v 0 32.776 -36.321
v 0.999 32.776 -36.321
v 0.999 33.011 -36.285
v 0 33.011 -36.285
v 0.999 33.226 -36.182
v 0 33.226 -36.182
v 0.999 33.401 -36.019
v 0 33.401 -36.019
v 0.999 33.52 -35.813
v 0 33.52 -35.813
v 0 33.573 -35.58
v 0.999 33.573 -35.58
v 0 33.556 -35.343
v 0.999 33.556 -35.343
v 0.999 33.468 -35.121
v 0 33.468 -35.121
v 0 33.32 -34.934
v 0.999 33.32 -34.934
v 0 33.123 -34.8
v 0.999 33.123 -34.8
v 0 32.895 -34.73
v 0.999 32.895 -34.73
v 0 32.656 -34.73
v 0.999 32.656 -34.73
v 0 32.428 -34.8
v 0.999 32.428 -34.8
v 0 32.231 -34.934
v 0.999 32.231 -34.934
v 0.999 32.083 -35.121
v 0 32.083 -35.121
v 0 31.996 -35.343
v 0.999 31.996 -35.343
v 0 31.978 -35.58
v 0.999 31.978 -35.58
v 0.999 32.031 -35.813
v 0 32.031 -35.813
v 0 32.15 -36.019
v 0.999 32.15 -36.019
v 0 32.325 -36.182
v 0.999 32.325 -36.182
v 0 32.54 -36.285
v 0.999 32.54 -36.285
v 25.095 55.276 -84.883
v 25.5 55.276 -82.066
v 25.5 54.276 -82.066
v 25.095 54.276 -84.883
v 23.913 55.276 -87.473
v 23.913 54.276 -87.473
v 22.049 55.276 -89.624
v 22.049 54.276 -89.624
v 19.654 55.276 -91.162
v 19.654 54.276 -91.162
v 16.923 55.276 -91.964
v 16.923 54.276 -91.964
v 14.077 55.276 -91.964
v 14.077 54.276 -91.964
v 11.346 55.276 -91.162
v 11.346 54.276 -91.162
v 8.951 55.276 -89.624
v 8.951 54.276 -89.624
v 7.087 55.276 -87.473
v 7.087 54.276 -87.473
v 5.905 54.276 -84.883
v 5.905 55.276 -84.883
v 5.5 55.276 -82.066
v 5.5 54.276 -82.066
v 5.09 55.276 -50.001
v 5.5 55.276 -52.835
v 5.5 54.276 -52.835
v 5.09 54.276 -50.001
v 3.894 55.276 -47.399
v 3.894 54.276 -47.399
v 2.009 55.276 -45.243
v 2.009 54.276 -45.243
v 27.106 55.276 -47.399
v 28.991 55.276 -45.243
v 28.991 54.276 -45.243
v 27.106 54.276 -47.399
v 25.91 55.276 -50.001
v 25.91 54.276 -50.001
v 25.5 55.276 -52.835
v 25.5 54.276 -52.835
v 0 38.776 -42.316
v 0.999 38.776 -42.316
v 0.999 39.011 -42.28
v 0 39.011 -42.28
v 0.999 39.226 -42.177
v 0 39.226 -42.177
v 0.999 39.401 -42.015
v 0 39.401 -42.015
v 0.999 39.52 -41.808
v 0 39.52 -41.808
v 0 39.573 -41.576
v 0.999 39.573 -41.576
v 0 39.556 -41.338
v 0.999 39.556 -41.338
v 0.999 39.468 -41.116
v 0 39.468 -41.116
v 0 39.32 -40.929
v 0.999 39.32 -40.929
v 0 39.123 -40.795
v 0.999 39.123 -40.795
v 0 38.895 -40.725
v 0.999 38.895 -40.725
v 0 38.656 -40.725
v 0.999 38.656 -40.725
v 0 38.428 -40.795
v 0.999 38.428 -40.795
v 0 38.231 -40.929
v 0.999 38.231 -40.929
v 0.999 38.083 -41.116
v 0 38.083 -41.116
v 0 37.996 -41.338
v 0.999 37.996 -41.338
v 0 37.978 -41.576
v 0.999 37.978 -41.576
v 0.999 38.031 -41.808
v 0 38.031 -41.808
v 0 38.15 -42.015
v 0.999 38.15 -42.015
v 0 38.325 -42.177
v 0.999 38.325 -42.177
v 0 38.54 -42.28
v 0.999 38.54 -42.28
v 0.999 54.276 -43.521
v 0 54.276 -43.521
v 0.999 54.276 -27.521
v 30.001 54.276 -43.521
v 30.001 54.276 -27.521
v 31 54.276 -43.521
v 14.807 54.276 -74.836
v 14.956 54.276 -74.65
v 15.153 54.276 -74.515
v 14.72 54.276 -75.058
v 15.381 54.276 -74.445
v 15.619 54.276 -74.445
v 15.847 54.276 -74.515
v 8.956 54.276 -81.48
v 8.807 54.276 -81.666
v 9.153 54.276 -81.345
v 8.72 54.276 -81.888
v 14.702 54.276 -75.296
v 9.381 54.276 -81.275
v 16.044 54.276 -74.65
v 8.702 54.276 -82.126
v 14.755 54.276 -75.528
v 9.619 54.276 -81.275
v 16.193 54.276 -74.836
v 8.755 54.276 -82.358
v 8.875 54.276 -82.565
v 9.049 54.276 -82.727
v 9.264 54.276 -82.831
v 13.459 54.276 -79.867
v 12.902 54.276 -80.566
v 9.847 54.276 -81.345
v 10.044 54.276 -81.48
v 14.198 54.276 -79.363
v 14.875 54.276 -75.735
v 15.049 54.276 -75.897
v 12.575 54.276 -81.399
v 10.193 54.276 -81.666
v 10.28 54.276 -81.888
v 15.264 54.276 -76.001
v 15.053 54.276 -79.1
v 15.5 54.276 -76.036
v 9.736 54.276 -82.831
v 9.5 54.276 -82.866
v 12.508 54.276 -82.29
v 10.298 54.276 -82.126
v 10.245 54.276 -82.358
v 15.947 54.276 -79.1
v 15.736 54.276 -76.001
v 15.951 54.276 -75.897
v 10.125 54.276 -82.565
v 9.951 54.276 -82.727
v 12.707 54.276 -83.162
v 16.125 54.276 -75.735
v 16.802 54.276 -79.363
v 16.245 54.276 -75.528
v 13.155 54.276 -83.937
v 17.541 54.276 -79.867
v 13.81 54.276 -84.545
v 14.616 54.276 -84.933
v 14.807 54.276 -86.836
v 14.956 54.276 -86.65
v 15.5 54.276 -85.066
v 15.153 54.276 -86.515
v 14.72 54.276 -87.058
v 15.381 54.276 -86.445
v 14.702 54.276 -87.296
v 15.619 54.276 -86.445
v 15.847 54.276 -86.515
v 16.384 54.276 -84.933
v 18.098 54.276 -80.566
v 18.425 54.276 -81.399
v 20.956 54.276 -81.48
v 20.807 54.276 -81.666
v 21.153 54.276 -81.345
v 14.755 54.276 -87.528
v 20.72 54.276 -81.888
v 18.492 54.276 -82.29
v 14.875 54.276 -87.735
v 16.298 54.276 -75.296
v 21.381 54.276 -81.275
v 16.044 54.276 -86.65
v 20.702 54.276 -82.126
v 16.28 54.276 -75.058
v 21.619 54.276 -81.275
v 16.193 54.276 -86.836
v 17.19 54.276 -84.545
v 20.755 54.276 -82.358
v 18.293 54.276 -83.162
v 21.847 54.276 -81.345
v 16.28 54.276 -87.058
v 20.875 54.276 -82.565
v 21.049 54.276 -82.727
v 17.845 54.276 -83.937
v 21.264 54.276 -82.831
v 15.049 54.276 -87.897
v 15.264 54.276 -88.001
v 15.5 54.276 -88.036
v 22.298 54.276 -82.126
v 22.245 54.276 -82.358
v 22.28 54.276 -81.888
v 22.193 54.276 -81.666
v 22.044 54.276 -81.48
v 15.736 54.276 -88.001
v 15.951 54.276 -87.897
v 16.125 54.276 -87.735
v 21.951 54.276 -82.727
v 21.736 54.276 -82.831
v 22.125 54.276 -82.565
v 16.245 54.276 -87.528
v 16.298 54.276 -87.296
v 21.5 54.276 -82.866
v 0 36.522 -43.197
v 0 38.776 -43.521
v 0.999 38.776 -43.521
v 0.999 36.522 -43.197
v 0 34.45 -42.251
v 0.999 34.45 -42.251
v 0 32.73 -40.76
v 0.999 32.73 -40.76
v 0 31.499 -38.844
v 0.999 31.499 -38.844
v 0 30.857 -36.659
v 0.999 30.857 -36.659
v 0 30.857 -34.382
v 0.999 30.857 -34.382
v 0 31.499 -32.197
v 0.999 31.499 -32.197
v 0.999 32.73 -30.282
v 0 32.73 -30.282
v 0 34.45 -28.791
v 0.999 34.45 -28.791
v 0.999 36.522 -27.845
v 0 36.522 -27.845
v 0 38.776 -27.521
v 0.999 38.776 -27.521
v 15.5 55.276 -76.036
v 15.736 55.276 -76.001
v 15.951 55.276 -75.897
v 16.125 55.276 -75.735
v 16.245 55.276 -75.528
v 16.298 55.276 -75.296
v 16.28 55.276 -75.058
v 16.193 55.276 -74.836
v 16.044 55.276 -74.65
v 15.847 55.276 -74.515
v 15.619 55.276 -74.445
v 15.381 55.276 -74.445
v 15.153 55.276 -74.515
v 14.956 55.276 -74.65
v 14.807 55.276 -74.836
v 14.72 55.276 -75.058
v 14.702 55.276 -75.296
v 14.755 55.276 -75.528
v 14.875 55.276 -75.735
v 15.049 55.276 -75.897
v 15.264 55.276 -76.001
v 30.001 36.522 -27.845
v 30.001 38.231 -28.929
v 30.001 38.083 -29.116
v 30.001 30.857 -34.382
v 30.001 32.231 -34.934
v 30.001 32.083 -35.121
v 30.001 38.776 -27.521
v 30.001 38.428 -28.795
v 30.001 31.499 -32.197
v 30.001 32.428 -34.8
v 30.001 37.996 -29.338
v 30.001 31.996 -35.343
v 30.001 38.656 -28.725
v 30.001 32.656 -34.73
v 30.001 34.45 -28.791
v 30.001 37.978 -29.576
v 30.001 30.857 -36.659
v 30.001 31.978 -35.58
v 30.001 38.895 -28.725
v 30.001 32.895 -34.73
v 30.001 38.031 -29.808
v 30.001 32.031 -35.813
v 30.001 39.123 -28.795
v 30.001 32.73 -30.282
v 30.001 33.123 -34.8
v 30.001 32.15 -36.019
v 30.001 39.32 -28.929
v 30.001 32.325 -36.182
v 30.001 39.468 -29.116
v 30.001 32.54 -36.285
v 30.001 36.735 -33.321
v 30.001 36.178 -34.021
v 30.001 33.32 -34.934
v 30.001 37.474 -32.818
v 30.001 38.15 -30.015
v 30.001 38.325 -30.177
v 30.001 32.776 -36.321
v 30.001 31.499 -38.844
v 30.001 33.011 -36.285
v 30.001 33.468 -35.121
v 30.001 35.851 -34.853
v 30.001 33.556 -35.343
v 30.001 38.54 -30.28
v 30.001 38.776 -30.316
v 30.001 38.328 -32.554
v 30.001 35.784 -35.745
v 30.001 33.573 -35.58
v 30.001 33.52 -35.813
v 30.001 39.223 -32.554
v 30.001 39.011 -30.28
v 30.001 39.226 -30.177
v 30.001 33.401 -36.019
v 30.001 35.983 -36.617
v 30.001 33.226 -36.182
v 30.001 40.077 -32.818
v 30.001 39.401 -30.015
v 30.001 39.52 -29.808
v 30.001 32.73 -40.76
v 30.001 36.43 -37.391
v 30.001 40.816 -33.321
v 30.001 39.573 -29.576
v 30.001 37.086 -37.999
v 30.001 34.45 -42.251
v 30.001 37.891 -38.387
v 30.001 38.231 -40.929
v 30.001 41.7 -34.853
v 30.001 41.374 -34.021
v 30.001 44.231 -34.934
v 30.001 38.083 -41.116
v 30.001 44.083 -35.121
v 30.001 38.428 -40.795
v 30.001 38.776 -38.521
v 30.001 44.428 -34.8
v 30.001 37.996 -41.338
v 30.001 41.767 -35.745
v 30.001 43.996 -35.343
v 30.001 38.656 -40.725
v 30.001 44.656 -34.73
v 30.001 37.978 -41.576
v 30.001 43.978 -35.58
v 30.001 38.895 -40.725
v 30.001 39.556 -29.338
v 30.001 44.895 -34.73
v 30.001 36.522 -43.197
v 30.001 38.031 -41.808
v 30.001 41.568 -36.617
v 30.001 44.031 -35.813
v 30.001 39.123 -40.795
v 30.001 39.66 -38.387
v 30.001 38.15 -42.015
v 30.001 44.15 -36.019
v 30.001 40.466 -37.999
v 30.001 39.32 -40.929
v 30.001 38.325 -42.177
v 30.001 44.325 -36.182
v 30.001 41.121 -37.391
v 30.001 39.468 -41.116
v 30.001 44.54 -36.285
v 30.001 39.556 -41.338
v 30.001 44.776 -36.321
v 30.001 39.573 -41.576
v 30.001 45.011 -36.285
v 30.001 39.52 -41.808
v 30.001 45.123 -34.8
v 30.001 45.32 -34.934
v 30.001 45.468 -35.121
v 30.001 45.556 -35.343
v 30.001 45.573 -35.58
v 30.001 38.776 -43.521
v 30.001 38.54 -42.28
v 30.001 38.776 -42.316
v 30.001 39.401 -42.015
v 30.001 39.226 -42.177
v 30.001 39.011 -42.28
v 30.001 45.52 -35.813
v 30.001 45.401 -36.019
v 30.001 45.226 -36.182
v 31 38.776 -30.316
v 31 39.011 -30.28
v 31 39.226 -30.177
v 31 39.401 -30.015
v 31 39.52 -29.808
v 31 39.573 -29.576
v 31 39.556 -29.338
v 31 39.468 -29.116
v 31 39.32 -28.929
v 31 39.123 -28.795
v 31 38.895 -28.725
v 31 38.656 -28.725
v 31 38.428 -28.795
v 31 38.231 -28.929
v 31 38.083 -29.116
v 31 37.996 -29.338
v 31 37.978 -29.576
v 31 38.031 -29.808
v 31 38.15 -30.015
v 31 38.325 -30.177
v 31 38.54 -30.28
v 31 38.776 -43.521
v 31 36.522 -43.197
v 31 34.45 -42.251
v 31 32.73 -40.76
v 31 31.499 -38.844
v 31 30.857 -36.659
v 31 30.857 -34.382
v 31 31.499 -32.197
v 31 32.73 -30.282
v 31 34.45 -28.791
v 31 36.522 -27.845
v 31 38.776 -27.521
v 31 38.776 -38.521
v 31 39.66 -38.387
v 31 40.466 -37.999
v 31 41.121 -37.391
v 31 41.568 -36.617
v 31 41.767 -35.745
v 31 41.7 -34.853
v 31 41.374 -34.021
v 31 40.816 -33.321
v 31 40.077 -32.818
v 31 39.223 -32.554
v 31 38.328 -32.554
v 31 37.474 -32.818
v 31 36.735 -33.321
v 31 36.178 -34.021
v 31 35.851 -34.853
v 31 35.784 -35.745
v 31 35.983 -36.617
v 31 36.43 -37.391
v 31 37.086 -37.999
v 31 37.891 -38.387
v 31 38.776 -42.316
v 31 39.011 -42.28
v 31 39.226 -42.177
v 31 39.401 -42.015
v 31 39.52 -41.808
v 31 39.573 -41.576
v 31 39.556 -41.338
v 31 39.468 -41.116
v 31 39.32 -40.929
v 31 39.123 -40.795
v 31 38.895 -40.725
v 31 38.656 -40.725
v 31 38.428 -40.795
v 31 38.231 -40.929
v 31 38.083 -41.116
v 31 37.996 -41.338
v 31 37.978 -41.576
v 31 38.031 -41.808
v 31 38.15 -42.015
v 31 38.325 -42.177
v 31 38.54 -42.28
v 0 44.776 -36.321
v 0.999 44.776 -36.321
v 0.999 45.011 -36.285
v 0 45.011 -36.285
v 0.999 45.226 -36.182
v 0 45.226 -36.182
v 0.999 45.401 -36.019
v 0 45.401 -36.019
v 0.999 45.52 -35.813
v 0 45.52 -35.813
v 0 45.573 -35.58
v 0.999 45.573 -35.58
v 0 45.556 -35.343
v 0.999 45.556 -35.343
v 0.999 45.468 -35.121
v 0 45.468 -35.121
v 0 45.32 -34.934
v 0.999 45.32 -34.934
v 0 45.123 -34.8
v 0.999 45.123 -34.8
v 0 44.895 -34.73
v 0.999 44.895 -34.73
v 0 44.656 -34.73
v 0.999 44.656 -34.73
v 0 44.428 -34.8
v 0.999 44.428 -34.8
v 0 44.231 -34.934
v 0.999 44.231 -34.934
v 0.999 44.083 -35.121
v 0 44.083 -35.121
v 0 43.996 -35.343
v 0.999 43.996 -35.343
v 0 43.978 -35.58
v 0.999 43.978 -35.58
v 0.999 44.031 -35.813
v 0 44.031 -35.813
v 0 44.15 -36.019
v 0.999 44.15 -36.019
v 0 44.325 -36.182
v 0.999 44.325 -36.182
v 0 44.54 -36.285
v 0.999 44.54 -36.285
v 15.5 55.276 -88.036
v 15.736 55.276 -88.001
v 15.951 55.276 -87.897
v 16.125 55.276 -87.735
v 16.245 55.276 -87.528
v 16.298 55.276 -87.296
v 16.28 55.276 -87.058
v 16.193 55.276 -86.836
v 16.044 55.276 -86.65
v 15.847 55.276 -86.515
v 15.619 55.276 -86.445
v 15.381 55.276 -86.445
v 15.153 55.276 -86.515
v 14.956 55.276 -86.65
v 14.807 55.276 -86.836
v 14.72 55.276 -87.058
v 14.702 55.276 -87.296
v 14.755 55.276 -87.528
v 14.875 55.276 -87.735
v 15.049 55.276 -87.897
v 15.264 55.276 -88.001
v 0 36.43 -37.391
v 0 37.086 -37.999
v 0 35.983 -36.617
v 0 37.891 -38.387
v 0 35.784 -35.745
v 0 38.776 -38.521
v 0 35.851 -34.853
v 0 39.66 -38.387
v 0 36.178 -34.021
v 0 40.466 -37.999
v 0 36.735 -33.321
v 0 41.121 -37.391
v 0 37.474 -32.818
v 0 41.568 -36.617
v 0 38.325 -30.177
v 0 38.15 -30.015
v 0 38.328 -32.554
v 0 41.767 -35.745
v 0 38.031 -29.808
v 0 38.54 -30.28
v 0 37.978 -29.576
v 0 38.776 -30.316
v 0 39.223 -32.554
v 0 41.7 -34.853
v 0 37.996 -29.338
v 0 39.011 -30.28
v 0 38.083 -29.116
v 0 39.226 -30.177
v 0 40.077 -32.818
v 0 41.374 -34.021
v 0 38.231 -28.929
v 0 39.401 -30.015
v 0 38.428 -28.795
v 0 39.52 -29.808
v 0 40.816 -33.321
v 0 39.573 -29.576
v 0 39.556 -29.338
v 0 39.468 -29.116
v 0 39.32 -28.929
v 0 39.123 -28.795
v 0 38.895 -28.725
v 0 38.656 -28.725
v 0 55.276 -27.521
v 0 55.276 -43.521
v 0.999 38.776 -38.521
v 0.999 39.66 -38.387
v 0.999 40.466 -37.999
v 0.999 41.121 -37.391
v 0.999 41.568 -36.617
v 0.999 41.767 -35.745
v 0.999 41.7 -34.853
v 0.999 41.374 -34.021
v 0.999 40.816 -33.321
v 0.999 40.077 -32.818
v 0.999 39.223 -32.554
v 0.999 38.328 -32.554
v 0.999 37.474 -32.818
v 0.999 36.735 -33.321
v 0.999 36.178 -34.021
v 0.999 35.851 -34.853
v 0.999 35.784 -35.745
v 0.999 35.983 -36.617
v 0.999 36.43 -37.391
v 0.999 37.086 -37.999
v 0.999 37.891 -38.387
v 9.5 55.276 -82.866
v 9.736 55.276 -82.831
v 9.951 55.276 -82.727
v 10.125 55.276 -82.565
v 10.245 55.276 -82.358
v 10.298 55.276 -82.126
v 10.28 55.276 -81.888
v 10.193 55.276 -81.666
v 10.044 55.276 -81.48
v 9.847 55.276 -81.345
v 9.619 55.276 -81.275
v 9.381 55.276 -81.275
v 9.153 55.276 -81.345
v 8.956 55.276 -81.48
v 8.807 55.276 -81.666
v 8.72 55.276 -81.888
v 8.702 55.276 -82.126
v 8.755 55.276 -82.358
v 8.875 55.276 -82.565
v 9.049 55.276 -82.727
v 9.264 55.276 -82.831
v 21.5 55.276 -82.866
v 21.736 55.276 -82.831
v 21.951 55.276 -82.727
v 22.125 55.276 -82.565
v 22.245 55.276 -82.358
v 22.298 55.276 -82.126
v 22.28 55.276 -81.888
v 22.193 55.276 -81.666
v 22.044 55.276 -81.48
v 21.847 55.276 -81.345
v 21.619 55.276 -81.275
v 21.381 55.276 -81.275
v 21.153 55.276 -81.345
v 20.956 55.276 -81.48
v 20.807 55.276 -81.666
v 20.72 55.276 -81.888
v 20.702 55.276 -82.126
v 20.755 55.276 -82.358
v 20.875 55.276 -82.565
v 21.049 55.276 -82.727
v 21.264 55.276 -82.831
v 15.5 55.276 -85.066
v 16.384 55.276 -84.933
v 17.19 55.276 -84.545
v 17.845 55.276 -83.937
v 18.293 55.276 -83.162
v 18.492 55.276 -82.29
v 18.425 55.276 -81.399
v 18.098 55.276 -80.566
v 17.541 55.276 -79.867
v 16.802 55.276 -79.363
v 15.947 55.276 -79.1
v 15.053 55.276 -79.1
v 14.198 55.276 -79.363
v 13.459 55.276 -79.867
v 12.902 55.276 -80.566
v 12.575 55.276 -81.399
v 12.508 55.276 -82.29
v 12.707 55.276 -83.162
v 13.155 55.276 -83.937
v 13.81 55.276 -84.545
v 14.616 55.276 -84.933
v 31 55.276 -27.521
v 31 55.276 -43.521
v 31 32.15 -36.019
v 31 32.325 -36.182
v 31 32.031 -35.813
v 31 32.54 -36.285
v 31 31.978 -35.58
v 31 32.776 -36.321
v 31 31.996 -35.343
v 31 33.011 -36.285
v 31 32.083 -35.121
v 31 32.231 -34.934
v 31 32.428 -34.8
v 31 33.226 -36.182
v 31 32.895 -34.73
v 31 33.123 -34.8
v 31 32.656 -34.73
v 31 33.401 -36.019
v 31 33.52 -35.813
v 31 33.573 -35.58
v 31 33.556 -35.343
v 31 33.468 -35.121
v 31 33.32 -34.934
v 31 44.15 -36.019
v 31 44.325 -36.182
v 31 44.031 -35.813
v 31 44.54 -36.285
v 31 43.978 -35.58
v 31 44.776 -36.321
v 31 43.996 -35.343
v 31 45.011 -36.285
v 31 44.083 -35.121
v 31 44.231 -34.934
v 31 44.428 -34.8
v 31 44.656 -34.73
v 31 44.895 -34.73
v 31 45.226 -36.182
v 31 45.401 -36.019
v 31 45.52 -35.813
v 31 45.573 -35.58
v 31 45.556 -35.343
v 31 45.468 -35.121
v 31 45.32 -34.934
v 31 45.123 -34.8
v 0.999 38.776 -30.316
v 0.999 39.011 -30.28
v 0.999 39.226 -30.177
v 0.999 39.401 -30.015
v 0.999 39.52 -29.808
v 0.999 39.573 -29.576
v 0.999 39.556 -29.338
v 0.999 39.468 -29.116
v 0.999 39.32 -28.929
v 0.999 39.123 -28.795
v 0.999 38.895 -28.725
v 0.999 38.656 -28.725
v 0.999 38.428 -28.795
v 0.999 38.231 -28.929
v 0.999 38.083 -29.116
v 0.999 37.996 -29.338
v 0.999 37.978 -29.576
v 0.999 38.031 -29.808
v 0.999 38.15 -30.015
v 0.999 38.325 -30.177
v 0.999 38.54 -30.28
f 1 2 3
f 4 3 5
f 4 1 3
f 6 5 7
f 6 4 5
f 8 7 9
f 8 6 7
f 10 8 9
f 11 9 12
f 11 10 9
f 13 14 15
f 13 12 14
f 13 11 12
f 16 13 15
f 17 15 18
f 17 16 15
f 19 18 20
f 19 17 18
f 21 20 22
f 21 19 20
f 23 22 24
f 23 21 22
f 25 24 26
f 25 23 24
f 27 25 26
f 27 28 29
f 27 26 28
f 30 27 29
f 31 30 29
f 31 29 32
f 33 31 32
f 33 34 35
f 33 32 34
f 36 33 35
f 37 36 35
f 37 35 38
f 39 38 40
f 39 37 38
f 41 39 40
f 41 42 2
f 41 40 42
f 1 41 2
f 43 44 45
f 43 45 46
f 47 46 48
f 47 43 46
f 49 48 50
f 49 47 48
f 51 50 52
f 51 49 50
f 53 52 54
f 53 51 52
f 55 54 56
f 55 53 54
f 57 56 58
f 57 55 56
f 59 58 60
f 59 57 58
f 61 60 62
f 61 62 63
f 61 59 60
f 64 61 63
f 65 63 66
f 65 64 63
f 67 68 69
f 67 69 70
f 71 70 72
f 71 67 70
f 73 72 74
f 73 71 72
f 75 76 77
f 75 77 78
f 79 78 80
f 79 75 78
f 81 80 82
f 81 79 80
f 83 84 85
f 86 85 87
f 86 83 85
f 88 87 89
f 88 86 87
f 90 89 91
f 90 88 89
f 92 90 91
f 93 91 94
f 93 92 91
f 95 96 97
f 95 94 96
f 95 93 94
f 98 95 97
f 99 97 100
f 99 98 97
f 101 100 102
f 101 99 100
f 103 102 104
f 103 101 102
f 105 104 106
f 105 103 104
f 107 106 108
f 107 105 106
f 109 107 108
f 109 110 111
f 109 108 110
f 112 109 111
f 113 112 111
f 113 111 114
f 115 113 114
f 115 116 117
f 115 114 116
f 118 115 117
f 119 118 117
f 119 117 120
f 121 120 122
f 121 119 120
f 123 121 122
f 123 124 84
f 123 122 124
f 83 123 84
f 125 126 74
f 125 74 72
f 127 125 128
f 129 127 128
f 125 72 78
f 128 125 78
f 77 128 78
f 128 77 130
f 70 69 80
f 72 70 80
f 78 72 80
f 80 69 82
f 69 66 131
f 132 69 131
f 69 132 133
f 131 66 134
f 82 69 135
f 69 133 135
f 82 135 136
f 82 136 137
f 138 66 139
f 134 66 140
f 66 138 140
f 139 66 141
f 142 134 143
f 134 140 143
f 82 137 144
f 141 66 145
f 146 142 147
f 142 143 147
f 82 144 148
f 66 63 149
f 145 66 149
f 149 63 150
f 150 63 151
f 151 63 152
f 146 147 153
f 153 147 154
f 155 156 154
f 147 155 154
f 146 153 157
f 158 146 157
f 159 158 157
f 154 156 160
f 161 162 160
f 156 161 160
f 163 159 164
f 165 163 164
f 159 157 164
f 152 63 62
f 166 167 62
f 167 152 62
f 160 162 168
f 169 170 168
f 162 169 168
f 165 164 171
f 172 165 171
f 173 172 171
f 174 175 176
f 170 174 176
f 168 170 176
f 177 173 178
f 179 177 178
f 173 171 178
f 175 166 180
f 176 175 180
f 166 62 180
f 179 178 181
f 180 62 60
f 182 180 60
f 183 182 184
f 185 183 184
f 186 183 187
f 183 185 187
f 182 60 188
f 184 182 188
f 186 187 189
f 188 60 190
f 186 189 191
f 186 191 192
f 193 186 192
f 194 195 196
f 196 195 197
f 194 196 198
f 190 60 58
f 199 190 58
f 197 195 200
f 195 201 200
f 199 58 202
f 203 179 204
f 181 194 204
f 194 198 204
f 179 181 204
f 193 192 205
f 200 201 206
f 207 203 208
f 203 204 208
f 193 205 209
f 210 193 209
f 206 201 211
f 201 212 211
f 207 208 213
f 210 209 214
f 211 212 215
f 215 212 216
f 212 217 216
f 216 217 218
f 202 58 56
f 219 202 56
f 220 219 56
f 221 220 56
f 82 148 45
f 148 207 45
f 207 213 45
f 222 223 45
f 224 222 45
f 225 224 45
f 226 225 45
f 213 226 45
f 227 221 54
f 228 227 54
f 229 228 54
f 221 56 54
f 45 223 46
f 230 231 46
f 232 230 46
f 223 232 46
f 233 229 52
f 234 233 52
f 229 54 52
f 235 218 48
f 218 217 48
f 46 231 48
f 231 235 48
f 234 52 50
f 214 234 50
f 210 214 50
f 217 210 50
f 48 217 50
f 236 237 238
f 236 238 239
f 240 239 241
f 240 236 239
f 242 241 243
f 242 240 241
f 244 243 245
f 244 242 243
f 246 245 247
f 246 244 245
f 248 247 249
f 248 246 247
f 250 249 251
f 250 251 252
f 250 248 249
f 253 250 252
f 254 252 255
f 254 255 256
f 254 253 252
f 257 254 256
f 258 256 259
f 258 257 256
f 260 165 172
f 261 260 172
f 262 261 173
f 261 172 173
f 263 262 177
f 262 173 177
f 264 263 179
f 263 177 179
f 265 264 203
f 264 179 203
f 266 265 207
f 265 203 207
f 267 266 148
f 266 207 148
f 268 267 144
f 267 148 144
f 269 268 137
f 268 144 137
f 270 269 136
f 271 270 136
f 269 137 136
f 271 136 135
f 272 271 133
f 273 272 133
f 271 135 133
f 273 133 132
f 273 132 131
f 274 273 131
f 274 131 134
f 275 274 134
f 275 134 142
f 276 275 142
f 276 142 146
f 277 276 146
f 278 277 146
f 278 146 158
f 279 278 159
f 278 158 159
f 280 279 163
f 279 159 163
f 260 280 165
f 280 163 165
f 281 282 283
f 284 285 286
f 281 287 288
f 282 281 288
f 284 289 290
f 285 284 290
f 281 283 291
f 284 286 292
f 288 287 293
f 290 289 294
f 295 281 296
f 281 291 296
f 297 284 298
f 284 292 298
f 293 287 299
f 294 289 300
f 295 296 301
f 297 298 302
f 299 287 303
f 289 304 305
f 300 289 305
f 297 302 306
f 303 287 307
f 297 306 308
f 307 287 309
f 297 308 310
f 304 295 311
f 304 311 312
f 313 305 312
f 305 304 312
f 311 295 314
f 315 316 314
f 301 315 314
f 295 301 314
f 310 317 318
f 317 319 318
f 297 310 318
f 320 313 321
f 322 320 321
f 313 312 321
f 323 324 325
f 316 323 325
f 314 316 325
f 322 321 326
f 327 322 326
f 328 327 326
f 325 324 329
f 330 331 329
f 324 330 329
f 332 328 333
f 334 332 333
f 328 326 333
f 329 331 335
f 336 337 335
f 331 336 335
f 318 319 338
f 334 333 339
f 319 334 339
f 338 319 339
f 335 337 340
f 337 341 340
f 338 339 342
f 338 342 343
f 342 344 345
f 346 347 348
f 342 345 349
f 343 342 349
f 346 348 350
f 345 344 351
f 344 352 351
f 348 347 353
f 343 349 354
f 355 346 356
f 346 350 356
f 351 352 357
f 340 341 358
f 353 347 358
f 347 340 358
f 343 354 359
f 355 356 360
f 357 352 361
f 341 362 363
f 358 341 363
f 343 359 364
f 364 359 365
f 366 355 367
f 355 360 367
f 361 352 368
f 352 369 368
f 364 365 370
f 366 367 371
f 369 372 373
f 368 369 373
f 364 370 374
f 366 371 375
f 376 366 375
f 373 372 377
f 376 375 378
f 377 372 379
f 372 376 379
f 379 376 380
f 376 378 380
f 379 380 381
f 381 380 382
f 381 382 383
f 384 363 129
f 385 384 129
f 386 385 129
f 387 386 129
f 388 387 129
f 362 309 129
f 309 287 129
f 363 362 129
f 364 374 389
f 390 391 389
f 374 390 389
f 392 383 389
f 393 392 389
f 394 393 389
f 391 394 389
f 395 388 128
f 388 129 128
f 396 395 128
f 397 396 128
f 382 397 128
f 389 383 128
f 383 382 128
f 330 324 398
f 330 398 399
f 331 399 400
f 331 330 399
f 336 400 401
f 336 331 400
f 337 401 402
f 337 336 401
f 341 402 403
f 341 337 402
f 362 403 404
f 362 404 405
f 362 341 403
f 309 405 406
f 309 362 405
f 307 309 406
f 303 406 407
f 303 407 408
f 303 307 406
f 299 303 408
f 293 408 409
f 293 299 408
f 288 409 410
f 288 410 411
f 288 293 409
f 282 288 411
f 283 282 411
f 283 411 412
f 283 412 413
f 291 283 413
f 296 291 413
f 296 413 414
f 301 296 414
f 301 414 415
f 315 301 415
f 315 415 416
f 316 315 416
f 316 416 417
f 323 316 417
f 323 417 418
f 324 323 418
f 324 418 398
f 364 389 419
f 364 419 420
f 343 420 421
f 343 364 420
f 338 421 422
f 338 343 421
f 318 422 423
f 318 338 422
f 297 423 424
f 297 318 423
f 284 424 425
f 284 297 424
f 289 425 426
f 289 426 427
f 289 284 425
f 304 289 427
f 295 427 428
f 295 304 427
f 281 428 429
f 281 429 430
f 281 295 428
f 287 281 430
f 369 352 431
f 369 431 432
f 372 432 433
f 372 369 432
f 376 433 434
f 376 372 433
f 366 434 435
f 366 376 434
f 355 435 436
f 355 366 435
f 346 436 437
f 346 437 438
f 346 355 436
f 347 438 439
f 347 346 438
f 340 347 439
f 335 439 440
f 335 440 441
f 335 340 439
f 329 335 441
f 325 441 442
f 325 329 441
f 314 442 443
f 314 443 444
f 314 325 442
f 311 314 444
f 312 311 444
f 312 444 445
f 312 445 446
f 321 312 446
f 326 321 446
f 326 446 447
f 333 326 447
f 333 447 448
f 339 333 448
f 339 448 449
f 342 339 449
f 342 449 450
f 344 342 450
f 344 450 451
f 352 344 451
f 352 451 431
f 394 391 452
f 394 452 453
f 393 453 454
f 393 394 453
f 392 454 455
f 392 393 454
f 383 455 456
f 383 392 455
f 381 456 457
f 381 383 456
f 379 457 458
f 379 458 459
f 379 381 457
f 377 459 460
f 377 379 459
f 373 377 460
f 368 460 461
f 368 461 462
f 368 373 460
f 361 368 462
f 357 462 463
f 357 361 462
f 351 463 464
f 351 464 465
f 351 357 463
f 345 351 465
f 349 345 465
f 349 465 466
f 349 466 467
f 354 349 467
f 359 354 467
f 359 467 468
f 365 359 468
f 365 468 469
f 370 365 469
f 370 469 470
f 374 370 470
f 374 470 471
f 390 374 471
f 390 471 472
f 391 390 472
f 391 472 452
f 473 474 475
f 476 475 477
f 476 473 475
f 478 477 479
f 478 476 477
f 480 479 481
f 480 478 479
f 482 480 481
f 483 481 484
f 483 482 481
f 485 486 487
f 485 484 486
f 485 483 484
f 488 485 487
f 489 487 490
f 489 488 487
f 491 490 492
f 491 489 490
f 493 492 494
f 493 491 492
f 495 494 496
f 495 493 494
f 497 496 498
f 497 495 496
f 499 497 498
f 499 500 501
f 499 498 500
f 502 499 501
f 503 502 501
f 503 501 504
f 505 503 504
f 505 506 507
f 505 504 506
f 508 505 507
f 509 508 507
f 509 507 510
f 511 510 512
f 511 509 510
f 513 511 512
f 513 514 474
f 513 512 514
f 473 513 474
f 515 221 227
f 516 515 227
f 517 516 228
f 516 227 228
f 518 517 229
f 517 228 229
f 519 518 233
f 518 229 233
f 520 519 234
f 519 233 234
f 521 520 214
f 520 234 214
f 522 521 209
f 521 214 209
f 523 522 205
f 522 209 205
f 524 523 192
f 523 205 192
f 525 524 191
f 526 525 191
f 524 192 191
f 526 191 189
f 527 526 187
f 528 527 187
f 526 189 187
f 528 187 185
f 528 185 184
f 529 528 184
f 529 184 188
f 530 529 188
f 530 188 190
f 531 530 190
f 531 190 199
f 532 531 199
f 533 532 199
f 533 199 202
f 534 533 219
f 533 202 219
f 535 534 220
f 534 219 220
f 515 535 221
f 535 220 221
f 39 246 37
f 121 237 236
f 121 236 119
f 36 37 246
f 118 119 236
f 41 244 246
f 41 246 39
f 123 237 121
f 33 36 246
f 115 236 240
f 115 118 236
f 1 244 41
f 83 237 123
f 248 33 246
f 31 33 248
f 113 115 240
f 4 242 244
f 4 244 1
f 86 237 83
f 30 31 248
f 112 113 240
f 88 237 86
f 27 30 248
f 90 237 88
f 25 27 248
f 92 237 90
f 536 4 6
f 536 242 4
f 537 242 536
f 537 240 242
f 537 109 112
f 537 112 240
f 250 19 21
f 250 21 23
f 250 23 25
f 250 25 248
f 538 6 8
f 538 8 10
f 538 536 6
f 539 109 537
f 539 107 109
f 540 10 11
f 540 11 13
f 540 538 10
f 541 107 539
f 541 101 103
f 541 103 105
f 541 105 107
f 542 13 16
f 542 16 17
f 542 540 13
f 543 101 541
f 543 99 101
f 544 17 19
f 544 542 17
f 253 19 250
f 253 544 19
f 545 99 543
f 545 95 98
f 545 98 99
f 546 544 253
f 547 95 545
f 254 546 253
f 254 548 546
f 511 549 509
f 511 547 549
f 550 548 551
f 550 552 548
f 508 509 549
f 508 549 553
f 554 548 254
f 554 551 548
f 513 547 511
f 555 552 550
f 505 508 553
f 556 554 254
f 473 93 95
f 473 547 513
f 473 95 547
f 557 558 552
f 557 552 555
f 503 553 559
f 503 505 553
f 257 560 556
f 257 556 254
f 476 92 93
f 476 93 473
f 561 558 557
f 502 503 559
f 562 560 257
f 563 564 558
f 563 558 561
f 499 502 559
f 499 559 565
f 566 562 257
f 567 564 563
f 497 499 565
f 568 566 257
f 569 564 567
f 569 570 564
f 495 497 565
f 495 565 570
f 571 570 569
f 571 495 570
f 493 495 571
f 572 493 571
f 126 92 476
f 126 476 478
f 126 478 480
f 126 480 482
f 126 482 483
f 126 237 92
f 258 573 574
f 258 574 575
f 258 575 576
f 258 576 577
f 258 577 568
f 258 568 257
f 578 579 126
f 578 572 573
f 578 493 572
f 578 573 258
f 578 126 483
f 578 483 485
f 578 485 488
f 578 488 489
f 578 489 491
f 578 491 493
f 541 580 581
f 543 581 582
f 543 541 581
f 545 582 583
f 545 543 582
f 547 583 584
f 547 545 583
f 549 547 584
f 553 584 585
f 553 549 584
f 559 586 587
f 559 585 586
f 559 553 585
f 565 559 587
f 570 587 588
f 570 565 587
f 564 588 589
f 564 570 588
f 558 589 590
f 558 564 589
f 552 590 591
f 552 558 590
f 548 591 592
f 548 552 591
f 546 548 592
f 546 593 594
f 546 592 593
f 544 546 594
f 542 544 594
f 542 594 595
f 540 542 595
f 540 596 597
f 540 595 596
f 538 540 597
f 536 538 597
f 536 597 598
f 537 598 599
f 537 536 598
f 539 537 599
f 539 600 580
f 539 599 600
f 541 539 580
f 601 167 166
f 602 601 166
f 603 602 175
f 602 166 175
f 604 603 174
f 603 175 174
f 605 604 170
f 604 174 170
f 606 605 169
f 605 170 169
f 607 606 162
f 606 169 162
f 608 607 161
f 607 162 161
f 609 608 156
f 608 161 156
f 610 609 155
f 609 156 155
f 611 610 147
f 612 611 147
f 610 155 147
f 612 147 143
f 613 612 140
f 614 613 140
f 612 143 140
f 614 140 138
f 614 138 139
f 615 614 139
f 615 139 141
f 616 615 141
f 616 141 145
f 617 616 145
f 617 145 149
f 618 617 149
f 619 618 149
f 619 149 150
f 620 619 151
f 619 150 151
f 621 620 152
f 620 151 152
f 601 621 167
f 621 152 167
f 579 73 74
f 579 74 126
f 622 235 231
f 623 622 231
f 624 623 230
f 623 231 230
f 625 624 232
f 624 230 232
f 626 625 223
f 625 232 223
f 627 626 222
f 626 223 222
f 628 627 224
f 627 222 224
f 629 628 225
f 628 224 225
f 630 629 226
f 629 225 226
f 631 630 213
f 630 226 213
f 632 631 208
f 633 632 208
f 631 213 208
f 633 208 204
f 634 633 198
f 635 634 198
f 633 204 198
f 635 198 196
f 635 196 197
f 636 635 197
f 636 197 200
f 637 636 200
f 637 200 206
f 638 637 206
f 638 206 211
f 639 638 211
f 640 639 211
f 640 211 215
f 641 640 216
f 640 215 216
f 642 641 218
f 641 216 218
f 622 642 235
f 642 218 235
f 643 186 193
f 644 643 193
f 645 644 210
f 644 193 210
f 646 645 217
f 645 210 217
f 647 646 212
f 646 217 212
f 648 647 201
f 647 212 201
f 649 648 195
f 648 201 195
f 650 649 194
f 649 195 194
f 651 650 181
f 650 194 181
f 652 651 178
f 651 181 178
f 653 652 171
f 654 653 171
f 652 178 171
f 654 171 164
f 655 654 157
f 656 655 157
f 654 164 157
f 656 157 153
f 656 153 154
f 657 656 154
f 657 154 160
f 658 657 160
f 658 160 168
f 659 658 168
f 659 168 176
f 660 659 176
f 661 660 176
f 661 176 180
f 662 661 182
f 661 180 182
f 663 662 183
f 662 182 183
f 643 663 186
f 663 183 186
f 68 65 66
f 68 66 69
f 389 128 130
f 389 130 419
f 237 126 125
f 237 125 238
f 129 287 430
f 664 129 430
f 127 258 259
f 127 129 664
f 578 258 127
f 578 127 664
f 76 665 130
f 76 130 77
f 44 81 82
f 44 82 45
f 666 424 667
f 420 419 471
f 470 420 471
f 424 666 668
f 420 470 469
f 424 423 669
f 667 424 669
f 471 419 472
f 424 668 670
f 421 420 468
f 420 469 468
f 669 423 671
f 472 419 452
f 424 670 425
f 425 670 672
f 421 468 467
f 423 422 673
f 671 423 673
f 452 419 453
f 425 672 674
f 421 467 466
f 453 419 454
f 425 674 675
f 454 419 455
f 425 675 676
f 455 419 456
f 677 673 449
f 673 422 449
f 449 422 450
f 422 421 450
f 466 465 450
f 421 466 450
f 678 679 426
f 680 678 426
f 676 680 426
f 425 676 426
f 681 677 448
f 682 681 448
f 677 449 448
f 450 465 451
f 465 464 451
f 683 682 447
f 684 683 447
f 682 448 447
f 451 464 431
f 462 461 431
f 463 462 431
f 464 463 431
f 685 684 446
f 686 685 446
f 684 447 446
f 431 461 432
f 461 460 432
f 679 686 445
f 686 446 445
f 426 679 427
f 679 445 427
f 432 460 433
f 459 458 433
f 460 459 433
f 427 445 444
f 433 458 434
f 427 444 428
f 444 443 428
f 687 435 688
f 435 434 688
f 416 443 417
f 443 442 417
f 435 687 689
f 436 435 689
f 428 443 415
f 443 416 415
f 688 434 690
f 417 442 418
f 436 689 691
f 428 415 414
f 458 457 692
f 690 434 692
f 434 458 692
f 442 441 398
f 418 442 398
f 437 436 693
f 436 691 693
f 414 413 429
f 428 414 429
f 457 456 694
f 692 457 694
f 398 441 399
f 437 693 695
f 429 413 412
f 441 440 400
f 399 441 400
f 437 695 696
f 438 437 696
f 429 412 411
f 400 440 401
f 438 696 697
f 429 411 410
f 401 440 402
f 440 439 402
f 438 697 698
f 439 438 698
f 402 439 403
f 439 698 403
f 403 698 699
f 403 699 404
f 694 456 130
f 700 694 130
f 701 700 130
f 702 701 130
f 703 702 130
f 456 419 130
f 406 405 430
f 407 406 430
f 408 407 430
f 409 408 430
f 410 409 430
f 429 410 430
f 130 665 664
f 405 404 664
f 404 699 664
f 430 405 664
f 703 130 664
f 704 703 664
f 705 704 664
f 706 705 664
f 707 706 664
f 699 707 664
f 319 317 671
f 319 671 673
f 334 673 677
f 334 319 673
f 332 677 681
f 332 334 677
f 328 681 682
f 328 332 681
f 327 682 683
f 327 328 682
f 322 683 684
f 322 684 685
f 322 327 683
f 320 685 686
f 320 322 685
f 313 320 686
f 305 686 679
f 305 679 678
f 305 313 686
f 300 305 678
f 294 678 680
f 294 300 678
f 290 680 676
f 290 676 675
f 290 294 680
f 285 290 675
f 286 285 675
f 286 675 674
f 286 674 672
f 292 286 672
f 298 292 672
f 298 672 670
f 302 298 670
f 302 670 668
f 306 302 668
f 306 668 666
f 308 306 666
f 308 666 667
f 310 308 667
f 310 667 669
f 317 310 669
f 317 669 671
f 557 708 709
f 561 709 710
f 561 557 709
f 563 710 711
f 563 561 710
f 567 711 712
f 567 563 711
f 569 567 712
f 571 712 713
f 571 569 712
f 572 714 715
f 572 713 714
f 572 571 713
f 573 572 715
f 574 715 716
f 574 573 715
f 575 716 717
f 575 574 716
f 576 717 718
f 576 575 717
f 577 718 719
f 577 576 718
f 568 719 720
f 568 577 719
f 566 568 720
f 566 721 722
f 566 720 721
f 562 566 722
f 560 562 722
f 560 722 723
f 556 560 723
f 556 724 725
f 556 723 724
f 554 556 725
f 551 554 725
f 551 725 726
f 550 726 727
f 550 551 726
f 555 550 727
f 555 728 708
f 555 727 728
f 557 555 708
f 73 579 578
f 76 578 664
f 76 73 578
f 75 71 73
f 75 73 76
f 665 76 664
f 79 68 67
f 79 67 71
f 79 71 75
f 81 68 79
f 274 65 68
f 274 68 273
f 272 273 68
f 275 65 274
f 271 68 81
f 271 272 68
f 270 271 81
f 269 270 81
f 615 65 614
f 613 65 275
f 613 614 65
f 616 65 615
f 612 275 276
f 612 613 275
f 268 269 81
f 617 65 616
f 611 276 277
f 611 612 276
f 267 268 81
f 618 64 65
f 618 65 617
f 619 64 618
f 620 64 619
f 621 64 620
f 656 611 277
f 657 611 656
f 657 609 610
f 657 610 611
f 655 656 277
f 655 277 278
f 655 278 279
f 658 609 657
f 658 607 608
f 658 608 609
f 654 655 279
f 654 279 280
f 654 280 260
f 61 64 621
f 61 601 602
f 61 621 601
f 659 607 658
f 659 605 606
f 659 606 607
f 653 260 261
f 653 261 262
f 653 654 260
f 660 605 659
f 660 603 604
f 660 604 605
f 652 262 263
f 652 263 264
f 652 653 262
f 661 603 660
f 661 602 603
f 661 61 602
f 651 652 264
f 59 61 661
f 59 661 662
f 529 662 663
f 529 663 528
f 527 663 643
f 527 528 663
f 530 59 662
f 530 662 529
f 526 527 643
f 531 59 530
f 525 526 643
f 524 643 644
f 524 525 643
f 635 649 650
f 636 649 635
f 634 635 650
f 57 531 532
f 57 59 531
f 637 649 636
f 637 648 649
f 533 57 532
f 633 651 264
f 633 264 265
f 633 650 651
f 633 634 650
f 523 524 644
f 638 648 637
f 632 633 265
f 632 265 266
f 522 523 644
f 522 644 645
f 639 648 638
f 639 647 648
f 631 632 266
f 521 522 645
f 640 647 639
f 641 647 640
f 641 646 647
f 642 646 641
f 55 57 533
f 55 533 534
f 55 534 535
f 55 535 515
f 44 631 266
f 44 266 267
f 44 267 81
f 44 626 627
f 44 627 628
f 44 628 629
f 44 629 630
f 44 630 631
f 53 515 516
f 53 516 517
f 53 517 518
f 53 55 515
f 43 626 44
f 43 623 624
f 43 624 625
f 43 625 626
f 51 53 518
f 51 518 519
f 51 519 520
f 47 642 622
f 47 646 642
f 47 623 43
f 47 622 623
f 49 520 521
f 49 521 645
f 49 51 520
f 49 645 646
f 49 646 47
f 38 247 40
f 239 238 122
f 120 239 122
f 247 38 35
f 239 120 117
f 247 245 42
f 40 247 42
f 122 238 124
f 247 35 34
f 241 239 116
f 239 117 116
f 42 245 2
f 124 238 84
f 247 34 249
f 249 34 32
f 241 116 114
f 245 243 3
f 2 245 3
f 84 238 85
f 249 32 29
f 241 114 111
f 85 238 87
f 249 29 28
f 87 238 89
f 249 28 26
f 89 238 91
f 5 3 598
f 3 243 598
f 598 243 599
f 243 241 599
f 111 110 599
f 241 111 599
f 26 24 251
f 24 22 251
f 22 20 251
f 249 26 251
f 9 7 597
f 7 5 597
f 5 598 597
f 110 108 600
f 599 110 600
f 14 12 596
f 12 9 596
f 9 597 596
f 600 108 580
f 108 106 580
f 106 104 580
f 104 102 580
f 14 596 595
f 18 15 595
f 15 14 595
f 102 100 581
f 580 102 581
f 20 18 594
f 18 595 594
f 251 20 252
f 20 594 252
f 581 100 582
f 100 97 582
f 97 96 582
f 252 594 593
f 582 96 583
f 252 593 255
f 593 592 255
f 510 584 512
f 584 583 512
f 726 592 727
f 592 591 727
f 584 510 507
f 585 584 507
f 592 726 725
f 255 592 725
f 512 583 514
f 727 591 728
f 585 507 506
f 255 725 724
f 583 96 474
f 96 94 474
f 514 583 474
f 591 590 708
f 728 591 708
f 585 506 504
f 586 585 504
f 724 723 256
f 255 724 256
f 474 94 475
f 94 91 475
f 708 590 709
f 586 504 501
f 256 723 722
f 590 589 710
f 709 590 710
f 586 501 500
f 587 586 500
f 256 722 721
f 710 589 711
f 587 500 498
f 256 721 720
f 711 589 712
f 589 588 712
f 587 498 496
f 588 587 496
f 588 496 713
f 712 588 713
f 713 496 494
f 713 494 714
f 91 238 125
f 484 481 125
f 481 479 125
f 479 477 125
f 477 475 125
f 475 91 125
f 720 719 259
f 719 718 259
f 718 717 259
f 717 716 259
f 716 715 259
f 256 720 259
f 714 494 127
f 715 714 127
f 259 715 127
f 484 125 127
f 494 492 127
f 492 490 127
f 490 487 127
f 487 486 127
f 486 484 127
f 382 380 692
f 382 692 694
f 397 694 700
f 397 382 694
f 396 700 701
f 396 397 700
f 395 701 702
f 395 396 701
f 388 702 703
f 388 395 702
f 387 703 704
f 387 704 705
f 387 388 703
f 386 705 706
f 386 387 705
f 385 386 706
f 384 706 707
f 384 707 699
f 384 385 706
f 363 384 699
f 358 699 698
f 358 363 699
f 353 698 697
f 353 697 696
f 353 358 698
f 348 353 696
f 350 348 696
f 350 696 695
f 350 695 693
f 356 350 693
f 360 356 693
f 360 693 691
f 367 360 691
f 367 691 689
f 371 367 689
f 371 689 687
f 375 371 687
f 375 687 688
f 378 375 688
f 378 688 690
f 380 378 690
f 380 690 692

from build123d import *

# Parameters (mm, degrees)
SKETCH1_R           = 0.8
SKETCH1_R_2         = 3
BOSS_EXTRUDE1_DEPTH = 31
BOSS_EXTRUDE2_DEPTH = 1
SKETCH5_R           = 0.8
CUT_EXTRUDE3_DEPTH  = 1
SKETCH5_3_R         = 3
CUT_EXTRUDE4_DEPTH  = 1
CUT_EXTRUDE5_START  = -1
CUT_EXTRUDE5_DEPTH  = 100.186902849


with BuildPart() as part:
    # Sketch1 → Boss-Extrude1 (new body)
    with BuildSketch(Plane(origin=(0, 0, 0), x_dir=(0, 0, -1), z_dir=(1, 0, 0))):
        with BuildLine():
            Line((27.520646447, 38.775594), (27.520646447, 55.275594))
            Line((27.520646447, 55.275594), (43.520646447, 55.275594))
            Line((43.520646447, 55.275594), (43.520646447, 38.775594))
            ThreePointArc((43.520646447, 38.775594), (35.520646447, 30.775594), (27.520646447, 38.775594))
        make_face()
        with Locations((35.520646447, 44.775594)):
            Circle(SKETCH1_R, mode=Mode.SUBTRACT)
        with Locations((41.515881392, 38.775594)):
            Circle(SKETCH1_R, mode=Mode.SUBTRACT)
        with Locations((35.520646447, 32.775594)):
            Circle(SKETCH1_R, mode=Mode.SUBTRACT)
        with Locations((29.515881392, 38.775594)):
            Circle(SKETCH1_R, mode=Mode.SUBTRACT)
        with Locations((35.520646447, 38.775594)):
            Circle(SKETCH1_R_2, mode=Mode.SUBTRACT)
    extrude(amount=BOSS_EXTRUDE1_DEPTH)

    # Sketch4 → Boss-Extrude2 (add)
    with BuildSketch(Plane(origin=(0, 55.275594, 0), x_dir=(1, 0, 0), z_dir=(0, 1, 0))):
        with BuildLine():
            Line((0, 43.520646447), (31, 43.520646447))
            Line((31, 43.520646447), (28.991162523, 45.242931174))
            ThreePointArc((28.991162523, 45.242931174), (26.414616828, 48.656689929), (25.5, 52.83470532))
            Line((25.5, 52.83470532), (25.5, 82.06609312))
            ThreePointArc((25.5, 82.06609312), (15.5, 92.06609312), (5.5, 82.06609312))
            Line((5.5, 82.06609312), (5.5, 52.83470532))
            ThreePointArc((5.5, 52.83470532), (4.585383172, 48.656689929), (2.008837477, 45.242931174))
            Line((2.008837477, 45.242931174), (0, 43.520646447))
        make_face()
    extrude(amount=-BOSS_EXTRUDE2_DEPTH)

    # Sketch5 → Cut-Extrude3 (cut)
    with BuildSketch(Plane.XZ.offset(-54.275594)):
        with Locations((9.5, -82.06609312)):
            Circle(SKETCH5_R)
        with Locations((15.5, -75.236093118)):
            Circle(SKETCH5_R)
        with Locations((21.5, -82.06609312)):
            Circle(SKETCH5_R)
        with Locations((15.5, -87.236093118)):
            Circle(SKETCH5_R)
    extrude(amount=-CUT_EXTRUDE3_DEPTH, mode=Mode.SUBTRACT)

    # Sketch5<3> → Cut-Extrude4 (cut)
    with BuildSketch(Plane.XZ.offset(-54.275594)):
        with Locations((15.5, -82.06609312)):
            Circle(SKETCH5_3_R)
    extrude(amount=-CUT_EXTRUDE4_DEPTH, mode=Mode.SUBTRACT)

    # Sketch6 → Cut-Extrude5 (cut, through all)
    with BuildSketch(Plane(origin=(0, 55.275594, 0), x_dir=(1, 0, 0), z_dir=(0, 1, 0)).offset(CUT_EXTRUDE5_START)):
        Polygon((0.999214172, 44.172026991), (0.999214172, 43.494699328), (0.999214172, 27.546593566), (0.999214172, 27.028954782), (30.000785828, 27.028954782), (30.000785828, 27.546593566), (30.000785828, 43.494699328), (30.000785828, 44.172026991), align=None)
    extrude(amount=-CUT_EXTRUDE5_DEPTH, mode=Mode.SUBTRACT)


solid = part.part
